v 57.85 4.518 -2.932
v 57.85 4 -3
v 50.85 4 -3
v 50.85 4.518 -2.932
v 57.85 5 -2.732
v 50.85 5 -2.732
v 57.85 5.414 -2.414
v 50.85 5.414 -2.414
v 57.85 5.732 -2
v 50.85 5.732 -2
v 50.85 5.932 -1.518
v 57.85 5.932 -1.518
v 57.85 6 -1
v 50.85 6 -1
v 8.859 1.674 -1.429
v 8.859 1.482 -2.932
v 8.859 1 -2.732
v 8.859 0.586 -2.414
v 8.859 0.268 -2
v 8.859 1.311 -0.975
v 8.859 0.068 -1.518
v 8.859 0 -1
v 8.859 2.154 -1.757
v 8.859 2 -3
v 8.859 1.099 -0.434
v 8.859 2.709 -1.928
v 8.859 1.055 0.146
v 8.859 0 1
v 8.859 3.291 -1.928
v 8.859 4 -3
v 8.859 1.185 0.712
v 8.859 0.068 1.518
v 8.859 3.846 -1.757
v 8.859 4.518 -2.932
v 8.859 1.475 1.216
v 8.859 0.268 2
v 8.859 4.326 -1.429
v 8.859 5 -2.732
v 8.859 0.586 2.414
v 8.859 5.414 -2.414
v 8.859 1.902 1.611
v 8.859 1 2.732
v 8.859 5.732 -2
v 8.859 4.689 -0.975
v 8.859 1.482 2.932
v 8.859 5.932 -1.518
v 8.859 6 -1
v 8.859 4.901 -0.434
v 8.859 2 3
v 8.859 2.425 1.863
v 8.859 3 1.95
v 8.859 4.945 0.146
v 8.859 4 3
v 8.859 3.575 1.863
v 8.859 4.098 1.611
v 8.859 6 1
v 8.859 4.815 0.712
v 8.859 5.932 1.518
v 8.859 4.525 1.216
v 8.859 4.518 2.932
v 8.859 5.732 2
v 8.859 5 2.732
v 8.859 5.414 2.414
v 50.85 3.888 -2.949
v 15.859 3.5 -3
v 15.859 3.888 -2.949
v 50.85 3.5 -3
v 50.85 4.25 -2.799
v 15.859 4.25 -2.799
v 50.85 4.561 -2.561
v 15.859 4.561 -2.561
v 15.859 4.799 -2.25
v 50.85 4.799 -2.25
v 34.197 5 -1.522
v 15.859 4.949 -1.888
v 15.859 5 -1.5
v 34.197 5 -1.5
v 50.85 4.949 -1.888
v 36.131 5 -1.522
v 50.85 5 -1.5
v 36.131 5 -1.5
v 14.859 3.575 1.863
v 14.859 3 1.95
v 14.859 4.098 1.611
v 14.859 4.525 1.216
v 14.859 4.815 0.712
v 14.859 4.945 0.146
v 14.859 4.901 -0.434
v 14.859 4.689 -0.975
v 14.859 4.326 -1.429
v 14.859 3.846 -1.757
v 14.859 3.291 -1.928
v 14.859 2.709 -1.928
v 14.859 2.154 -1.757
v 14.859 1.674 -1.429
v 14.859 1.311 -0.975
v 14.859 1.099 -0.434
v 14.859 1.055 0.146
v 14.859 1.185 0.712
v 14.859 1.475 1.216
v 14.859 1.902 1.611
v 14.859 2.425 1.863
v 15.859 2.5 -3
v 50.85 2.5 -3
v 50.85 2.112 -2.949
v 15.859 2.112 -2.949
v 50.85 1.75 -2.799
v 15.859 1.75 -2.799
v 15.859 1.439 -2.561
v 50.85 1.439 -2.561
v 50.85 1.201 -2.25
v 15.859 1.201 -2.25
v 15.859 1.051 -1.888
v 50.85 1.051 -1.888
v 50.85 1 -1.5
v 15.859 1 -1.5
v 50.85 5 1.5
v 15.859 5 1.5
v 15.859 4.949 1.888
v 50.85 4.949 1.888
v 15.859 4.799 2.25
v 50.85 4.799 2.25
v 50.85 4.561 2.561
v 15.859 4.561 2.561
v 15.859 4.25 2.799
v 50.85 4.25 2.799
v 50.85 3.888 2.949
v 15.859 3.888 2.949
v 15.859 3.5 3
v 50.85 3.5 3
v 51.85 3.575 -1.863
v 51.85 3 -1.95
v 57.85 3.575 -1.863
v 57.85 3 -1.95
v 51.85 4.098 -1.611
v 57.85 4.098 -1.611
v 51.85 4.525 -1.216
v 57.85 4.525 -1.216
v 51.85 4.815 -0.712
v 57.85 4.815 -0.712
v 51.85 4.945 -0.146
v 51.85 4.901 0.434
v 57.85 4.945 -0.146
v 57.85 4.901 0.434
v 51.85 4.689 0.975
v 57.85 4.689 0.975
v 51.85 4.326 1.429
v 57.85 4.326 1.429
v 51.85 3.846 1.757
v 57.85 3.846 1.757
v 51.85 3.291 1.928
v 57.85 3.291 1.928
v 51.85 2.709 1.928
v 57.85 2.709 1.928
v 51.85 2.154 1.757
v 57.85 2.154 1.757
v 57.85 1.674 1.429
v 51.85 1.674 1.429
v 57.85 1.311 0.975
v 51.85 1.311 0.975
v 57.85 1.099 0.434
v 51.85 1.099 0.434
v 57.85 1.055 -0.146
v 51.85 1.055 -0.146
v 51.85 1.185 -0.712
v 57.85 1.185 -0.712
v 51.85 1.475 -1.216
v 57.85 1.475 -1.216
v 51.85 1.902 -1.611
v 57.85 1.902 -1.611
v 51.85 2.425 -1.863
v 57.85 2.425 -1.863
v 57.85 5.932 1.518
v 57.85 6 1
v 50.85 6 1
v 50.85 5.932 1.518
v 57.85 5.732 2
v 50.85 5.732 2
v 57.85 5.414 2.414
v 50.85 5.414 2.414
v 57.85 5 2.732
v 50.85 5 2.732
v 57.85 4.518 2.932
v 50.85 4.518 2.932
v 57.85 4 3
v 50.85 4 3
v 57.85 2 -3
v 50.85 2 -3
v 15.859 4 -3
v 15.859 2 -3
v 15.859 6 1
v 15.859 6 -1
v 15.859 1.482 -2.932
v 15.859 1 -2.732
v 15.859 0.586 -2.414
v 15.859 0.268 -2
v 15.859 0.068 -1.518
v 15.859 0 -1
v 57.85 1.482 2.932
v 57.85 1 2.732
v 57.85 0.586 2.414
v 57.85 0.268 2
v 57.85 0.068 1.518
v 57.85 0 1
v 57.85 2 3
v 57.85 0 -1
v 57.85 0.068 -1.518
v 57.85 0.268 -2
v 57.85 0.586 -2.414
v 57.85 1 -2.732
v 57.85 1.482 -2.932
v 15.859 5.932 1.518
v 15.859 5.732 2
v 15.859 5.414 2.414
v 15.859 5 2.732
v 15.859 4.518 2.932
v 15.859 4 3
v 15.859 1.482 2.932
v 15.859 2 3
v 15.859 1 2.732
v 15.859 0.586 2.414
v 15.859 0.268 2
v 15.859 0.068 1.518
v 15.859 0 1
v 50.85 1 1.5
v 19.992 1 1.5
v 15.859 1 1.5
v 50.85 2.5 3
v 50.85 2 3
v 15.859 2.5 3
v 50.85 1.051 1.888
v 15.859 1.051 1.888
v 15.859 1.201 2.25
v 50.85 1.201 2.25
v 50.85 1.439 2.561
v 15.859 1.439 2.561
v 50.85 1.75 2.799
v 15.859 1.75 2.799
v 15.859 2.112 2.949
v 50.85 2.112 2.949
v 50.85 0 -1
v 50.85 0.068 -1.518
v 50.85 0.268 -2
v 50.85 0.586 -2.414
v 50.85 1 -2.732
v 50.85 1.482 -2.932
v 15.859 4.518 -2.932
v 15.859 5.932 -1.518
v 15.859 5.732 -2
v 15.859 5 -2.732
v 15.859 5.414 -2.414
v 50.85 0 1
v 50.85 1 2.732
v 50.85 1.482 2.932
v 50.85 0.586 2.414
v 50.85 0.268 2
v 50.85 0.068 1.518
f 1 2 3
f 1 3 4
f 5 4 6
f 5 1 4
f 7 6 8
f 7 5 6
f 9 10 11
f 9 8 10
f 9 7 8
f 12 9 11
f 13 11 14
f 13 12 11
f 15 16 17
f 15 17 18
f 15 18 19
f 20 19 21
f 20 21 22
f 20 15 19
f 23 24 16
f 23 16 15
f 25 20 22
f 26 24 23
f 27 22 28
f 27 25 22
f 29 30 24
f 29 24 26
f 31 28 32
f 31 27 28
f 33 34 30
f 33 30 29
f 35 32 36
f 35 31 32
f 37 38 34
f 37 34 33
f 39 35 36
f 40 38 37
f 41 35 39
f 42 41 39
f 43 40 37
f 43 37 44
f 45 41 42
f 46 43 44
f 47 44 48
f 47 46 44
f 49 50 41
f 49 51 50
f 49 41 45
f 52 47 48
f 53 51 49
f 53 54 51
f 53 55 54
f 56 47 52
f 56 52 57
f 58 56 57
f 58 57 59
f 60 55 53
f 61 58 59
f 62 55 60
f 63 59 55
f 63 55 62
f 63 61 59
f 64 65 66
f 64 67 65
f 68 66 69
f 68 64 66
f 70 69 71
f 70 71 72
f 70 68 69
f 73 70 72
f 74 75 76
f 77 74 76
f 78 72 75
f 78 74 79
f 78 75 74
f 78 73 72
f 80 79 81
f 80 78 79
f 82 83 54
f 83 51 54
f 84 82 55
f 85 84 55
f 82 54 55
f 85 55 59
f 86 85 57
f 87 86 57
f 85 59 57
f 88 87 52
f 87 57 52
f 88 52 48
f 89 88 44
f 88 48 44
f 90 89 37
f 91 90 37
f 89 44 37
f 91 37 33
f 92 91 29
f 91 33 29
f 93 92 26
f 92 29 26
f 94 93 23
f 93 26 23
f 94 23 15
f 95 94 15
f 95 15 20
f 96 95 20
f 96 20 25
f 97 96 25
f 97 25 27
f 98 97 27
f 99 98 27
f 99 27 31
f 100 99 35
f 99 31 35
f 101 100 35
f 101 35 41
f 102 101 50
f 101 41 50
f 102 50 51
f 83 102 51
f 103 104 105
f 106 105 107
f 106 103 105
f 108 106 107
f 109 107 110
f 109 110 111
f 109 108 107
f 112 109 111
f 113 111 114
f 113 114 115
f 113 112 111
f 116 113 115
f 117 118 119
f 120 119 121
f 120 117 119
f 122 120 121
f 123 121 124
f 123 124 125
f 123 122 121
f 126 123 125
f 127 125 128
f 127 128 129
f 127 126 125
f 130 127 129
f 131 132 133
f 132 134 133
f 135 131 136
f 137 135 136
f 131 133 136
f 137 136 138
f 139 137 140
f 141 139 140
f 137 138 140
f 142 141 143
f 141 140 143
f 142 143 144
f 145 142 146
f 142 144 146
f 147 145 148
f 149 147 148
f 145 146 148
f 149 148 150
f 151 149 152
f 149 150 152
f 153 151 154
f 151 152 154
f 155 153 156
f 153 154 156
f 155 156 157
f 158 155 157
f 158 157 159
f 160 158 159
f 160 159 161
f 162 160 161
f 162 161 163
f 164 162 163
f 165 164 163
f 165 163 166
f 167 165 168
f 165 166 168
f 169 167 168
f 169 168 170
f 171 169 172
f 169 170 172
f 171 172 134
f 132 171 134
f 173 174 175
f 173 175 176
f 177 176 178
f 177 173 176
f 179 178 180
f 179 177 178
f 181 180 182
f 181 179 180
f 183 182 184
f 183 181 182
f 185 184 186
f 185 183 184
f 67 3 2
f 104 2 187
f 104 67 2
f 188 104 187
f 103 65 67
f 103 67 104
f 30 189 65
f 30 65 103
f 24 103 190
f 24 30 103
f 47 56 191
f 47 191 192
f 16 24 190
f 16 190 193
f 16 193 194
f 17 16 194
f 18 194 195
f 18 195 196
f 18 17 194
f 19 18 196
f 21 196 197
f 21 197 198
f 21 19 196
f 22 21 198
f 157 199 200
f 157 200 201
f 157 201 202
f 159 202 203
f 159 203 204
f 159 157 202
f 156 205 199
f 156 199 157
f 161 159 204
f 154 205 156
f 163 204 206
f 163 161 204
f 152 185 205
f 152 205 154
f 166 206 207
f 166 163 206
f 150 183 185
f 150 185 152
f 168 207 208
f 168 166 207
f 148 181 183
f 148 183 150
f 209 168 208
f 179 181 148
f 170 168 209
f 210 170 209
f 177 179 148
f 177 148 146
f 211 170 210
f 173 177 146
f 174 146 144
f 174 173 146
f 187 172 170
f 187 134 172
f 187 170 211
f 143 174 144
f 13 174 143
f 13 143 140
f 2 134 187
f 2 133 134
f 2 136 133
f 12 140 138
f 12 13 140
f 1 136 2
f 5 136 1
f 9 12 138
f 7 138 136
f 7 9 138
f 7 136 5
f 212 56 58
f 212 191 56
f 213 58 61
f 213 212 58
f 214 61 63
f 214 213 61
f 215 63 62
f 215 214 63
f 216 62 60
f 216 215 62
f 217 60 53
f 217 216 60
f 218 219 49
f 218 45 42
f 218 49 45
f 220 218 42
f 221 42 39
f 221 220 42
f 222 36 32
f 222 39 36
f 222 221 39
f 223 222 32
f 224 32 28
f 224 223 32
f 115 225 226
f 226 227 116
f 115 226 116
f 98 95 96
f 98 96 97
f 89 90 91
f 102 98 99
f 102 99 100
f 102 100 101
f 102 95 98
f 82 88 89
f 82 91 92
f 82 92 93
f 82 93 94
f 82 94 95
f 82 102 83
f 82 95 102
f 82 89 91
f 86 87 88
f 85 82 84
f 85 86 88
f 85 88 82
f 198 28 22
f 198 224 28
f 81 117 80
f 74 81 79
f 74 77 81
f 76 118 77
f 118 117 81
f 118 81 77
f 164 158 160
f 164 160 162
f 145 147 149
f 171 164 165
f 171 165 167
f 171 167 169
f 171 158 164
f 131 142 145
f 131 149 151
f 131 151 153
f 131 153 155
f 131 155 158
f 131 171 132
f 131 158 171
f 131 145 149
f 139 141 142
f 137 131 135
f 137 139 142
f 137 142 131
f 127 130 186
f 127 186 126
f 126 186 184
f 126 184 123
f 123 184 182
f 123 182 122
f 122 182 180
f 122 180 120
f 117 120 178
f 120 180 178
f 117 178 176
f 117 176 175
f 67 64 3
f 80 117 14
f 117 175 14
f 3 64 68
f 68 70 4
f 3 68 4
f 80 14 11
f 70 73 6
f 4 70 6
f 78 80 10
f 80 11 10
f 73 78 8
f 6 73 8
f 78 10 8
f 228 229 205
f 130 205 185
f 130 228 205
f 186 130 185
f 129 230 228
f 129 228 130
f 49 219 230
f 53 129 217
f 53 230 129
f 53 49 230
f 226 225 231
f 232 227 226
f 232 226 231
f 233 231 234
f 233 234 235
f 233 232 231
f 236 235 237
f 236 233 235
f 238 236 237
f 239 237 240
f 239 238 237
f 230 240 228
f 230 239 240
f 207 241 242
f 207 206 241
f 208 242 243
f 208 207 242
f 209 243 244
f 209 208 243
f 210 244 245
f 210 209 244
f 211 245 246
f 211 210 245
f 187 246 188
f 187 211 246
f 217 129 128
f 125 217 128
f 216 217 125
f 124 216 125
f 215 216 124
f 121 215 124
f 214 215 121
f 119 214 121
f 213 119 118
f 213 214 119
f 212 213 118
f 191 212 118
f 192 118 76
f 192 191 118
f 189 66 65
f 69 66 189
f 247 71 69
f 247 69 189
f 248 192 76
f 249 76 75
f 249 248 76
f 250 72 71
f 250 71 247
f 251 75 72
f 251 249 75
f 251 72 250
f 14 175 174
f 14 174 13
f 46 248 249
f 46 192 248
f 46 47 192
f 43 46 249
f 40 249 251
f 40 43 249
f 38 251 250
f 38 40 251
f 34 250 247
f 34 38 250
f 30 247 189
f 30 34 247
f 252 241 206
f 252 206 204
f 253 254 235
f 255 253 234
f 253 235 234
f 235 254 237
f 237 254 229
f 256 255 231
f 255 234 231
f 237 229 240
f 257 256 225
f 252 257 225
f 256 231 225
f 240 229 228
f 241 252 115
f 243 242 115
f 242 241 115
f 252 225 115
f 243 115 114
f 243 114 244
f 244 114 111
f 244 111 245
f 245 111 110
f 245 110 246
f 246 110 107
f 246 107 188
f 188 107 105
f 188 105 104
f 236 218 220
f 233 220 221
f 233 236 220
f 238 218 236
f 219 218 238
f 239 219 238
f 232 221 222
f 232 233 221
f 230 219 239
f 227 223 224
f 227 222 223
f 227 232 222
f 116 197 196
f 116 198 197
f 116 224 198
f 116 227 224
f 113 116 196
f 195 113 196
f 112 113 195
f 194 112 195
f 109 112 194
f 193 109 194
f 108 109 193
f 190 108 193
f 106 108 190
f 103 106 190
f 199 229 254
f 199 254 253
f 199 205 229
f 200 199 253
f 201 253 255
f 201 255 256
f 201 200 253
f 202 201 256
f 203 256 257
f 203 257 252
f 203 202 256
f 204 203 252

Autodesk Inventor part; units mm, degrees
ref_plane "YZ Plane" through (0, 0, 0) normal (1, 0, 0) x (0, 1, 0)
ref_plane "XZ Plane" through (0, 0, 0) normal (0, 1, 0) x (-1, 0, 0)
ref_plane "XY Plane" through (0, 0, 0) normal (0, 0, 1) x (1, 0, 0)
sketch "Sketch1" plane through (0, 0, 0) normal (0, 1, 0) x (-1, 0, 0)
  point P0 (0, 0)
sketch "Sketch2" plane through (0, 0, 0) normal (0, 1, 0) x (-1, 0, 0)
  circle A0 centre (0, 0) radius 3.85
  dimension "d0" = 7.7
extrude "Extrusion1" add sketch "Sketch2" along normal blind 6
sketch "Sketch3" plane through (0, 6, 0) normal (0, 1, 0) x (1, 0, 0)
  circle A0 centre (0, 0) radius 1
  dimension "d3" = 2
extrude "Extrusion2" cut sketch "Sketch3" against normal through all
sketch "Sketch4" plane through (0, 0, 0) normal (0, -1, 0) x (1, 0, 0)
  circle A0 centre (0, 0) radius 3.85 projected
  line L0 (0, 3.85) -> (3.85, 3.85)
  line L1 (3.85, 3.85) -> (3.85, -3.85)
  line L2 (3.85, -3.85) -> (0, -3.85)
  line L3 (3.85, 3.85) -> (4.85, 3.85)
  line L4 (4.85, 3.85) -> (4.85, -3.85)
  line L5 (4.85, -3.85) -> (3.85, -3.85)
  line L6 (3.85, -3.85) -> (3.85, 3.85)
  line L7 (4.85, 3.85) -> (4.85, 3)
  line L8 (4.85, -3.85) -> (4.85, -3)
  line L9 (4.85, 3) -> (3.85, 3)
  line L10 (3.85, 3) -> (3.85, -3)
  line L11 (3.85, -3) -> (4.85, -3)
  line L12 (4.85, -3) -> (4.85, 3)
  point P0 (3.85, -3)
  dimension "d6" = 1
  dimension "d7" = 0.85
  dimension "d8" = 0.85
extrude "Extrusion3" add sketch "Sketch4" against normal blind 6 contours L1 L9 L4 L11
sketch "Sketch5" plane through (4.85, 0, 3) normal (1, 0, 0) x (0, 0, -1)
  line L0 (6.85, 0) -> (-0.85, 0) projected
  line L1 (6, 0) -> (6, 6) projected
  line L2 (0.0003, 0) -> (6, 0)
  line L3 (6, 0) -> (6, 1)
  line L4 (6, 1) -> (0.0003, 1)
  line L5 (0.0003, 1) -> (0.0003, 0)
  line L6 (6.85, 6) -> (-0.85, 6) projected
  line L7 (0.0003, 6) -> (6, 6)
  line L8 (6, 6) -> (6, 5)
  line L9 (6, 5) -> (0.0003, 5)
  line L10 (0.0003, 5) -> (0.0003, 6)
  point P0 (3, 0)
  point P1 (3, 6)
  dimension "d11" = 1
  dimension "d12" = 1
extrude "Extrusion4" cut sketch "Sketch5" against normal blind 1 contours L9 L10 L6 L1
extrude "Extrusion5" cut sketch "Sketch5" against normal blind 1 contours L0 L5 L4 L1
sketch "Sketch6" plane through (4.85, 5, 2.9997) normal (0, 0, -1) x (-1, 0, 0)
  line L0 (0, 0) -> (1, 0) projected
  line L1 (0, -5) -> (0, 1) projected
  line L2 (1, 0) -> (0, 0)
  line L3 (0, 0) -> (0, 1)
  line L4 (0, 1) -> (1, 1)
  line L5 (1, 1) -> (1, 0)
  line L6 (1, -5) -> (0, -5)
  line L7 (0, -5) -> (0, -3.9916)
  line L8 (0, -3.9916) -> (1, -3.9916)
  line L9 (1, -3.9916) -> (1, -5)
  point P0 (4.85, -5)
extrude "Extrusion6" cut sketch "Sketch6" against normal through all contours L1 L4 L5 L0
extrude "Extrusion7" cut sketch "Sketch6" against normal through all contours L1 L8 L9 L6
sketch "Sketch7" plane through (4.85, 5, 3) normal (1, 0, 0) x (0, 0, -1)
  line L0 (0, 0) -> (3, 0) projected
  line L1 (6, -4) -> (6, 0) projected
  line L2 (0, 0) -> (6, 0)
  line L3 (6, 0) -> (6, -4)
  line L4 (6, -4) -> (0, -4)
  line L5 (0, -4) -> (0, 0)
  point P0 (3, -5)
extrude "Extrusion8" add sketch "Sketch7" along normal blind 71
sketch "Sketch8" plane through (3.85, 1, -3) normal (0, 0, -1) x (-1, 0, 0)
  point P0 (3.85, -1)
sketch "Sketch9" plane through (3.85, 5, 0) normal (0, 1, 0) x (1, 0, 0)
  line L0 (72, 3) -> (72, -3) projected
  line L1 (72, 0) -> (75.85, 0)
  circle A0 centre (75.85, 0) radius 3.85
  point P0 (-3.85, 0)
  dimension "d23" = 3.85
extrude "Extrusion9" add sketch "Sketch9" along normal blind 1
extrude "Extrusion10" add sketch "Sketch9" against normal blind 5
sketch "Sketch10" plane through (79.7, 6, 0) normal (0, 1, 0) x (1, 0, 0)
  circle A0 centre (0, 0) radius 1.85
  point P0 (-79.7, 0)
  dimension "d28" = 3.7
extrude "Extrusion11" cut sketch "Sketch10" against normal through all
sketch "Sketch11" plane through (3.85, 5, 0) normal (-1, 0, 0) x (0, 0, 1)
  point P0 (0, -5)
sketch "Sketch12" plane through (3.85, 5, -3) normal (-1, 0, 0) x (0, 0, 1)
  line L0 (0, 0) -> (3, 0) projected
  line L1 (6, 0) -> (6, -4) projected
  line L2 (0, 0) -> (6, 0)
  line L3 (6, 0) -> (6, -4)
  line L4 (6, -4) -> (0, -4)
  line L5 (0, -4) -> (0, 0)
  point P0 (3, -5)
extrude "Extrusion12" add sketch "Sketch12" along normal blind 2
sketch "Sketch13" plane through (75.85, 5, 3) normal (1, 0, 0) x (0, 0, -1)
  line L0 (3, 0) -> (0, 0) projected
  line L1 (3, -4) -> (6, -4) projected
  line L2 (0, 0) -> (6, 0)
  line L3 (6, 0) -> (6, -4)
  line L4 (6, -4) -> (0, -4)
  line L5 (0, -4) -> (0, 0)
  point P0 (3, -5)
extrude "Extrusion13" add sketch "Sketch13" along normal blind 1.6
fillet "Fillet1" radius 1.5 2 edges at (76.5685, 5, 3) (39.1315, 5, 3)
fillet "Fillet2" radius 1.5 1 edges at (39.85, 5, -3)
fillet "Fillet3" radius 1.5 1 edges at (39.85, 1, -3)
fillet "Fillet4" radius 1.5 3 edges at (4.35, 1, 2.9997) (40.35, 1, 3) (4.85, 1, 2.9998)
sketch "Sketch14" plane through (3.5458, 5, 1.5) normal (0, 1, 0) x (1, 0, 0)
  point P0 (-3.5458, 1.5)
sketch "Sketch15" plane through (3.5458, 5, 1.5) normal (0, 1, 0) x (1, 0, 0)
  line L0 (0.4177, 2.9988) -> (2.9717, 2.9988) construction
  line L1 (2.9717, 2.9988) -> (2.9717, -0.0492) construction
  line L2 (2.9717, -0.0492) -> (0.4177, -0.0492) construction
  line L3 (0.4177, -0.0492) -> (0.4177, 2.9988) construction
  line L4 (0.398, -0.0492) -> (1.4255, 2.9988)
  line L5 (1.4255, 2.9988) -> (1.9244, 2.9988)
  line L6 (1.9244, 2.9988) -> (2.952, -0.0492)
  line L7 (2.952, -0.0492) -> (2.5247, -0.0492)
  line L8 (2.5247, -0.0492) -> (2.248, 0.803)
  line L9 (2.248, 0.803) -> (1.0846, 0.803)
  line L10 (1.0846, 0.803) -> (0.808, -0.0492)
  line L11 (0.808, -0.0492) -> (0.398, -0.0492)
  line L12 (2.1369, 1.1488) -> (1.6651, 2.5839)
  line L13 (1.6651, 2.5839) -> (1.1958, 1.1488)
  line L14 (1.1958, 1.1488) -> (2.1369, 1.1488)
  point P0 (-3.5458, 1.5)
extrude "Extrusion14" add sketch "Sketch15" along normal blind 0.2
sketch "Sketch16" plane through (3.5458, 5, -1.5) normal (0, 1, 0) x (1, 0, 0)
  line L0 (69.8363, -0.0038) -> (72.3064, -0.0038) construction
  line L1 (72.3064, -0.0038) -> (72.3064, -3.0518) construction
  line L2 (72.3064, -3.0518) -> (69.8363, -3.0518) construction
  line L3 (69.8363, -3.0518) -> (69.8363, -0.0038) construction
  spline S0 degree 2 poles (72.2125, -2.1157) (72.2125, -2.3429) (72.0396, -2.6912) (71.8963, -2.8048) knots 0 0 0 1 2 2 2
  spline S1 degree 2 poles (71.8963, -2.8048) (71.7234, -2.9382) (71.3307, -3.0518) (71.0195, -3.0518) knots 0 0 0 1 2 2 2
  line L4 (71.0195, -3.0518) -> (70.1451, -3.0518)
  line L5 (70.1451, -3.0518) -> (70.1451, -0.0038)
  line L6 (70.1451, -0.0038) -> (70.9528, -0.0038)
  spline S2 degree 2 poles (70.9528, -0.0038) (71.2788, -0.0038) (71.6049, -0.0458) (71.7531, -0.1273) knots 0 0 0 1 2 2 2
  spline S3 degree 2 poles (71.7531, -0.1273) (71.9186, -0.2138) (72.0692, -0.4978) (72.0692, -0.6905) knots 0 0 0 1 2 2 2
  spline S4 degree 2 poles (72.0692, -0.6905) (72.0692, -0.9054) (71.842, -1.2462) (71.6419, -1.3426) knots 0 0 0 1 2 2 2
  line L7 (71.6419, -1.3426) -> (71.6419, -1.3574)
  spline S5 degree 2 poles (71.6419, -1.3574) (71.9136, -1.4315) (72.2125, -1.8242) (72.2125, -2.1157) knots 0 0 0 1 2 2 2
  spline S6 degree 2 poles (71.7901, -2.133) (71.7901, -1.9601) (71.6913, -1.7378) (71.5431, -1.6587) knots 0 0 0 1 2 2 2
  spline S7 degree 2 poles (71.5431, -1.6587) (71.4468, -1.6093) (71.2195, -1.5797) (71.0096, -1.5797) knots 0 0 0 1 2 2 2
  line L8 (71.0096, -1.5797) -> (70.5502, -1.5797)
  line L9 (70.5502, -1.5797) -> (70.5502, -2.706)
  line L10 (70.5502, -2.706) -> (70.8787, -2.706)
  spline S8 degree 2 poles (70.8787, -2.706) (71.1454, -2.706) (71.4517, -2.6566) (71.5703, -2.5776) knots 0 0 0 1 2 2 2
  spline S9 degree 2 poles (71.5703, -2.5776) (71.6839, -2.4961) (71.7901, -2.2935) (71.7901, -2.133) knots 0 0 0 1 2 2 2
  spline S10 degree 2 poles (71.6469, -0.7473) (71.6469, -0.6386) (71.5728, -0.4756) (71.4912, -0.4287) knots 0 0 0 1 2 2 2
  spline S11 degree 2 poles (71.4912, -0.4287) (71.3924, -0.3743) (71.1529, -0.3496) (70.938, -0.3496) knots 0 0 0 1 2 2 2
  line L11 (70.938, -0.3496) -> (70.5502, -0.3496)
  line L12 (70.5502, -0.3496) -> (70.5502, -1.2413)
  line L13 (70.5502, -1.2413) -> (71.0096, -1.2413)
  spline S12 degree 2 poles (71.0096, -1.2413) (71.1998, -1.2413) (71.3801, -1.2018) (71.4764, -1.14) knots 0 0 0 1 2 2 2
  spline S13 degree 2 poles (71.4764, -1.14) (71.5703, -1.0807) (71.6469, -0.8905) (71.6469, -0.7473) knots 0 0 0 1 2 2 2
  point P0 (-3.5458, -1.5)
extrude "Extrusion15" add sketch "Sketch16" along normal blind 0.2
sketch "Sketch17" plane through (3.5458, 5, -1.5) normal (0, 1, 0) x (1, 0, 0)
  line L0 (0.4145, -1.5) -> (36.4145, -1.5)
  line L1 (30.4487, 0.0859) -> (55.6072, 0.0859) construction
  line L2 (55.6072, 0.0859) -> (55.6072, -2.5363) construction
  line L3 (55.6072, -2.5363) -> (30.4487, -2.5363) construction
  line L4 (30.4487, -2.5363) -> (30.4487, 0.0859) construction
  line L5 (32.5853, -0.4353) -> (31.2663, -3.0264)
  line L6 (31.2663, -3.0264) -> (30.8316, -3.0264)
  line L7 (30.8316, -3.0264) -> (32.2247, -0.3365)
  line L8 (32.2247, -0.3365) -> (30.6513, -0.3365)
  line L9 (30.6513, -0.3365) -> (30.6513, 0.0216)
  line L10 (30.6513, 0.0216) -> (32.5853, 0.0216)
  line L11 (32.5853, 0.0216) -> (32.5853, -0.4353)
  line L12 (34.838, -3.0264) -> (32.9583, -3.0264)
  line L13 (32.9583, -3.0264) -> (32.9583, -2.5941)
  spline S0 degree 2 poles (32.9583, -2.5941) (33.1608, -2.4039) (33.5214, -2.0507) (33.6943, -1.8605) knots 0 0 0 1 2 2 2
  spline S1 degree 2 poles (33.6943, -1.8605) (34.0426, -1.4777) (34.297, -1.0182) (34.297, -0.7737) knots 0 0 0 1 2 2 2
  spline S2 degree 2 poles (34.297, -0.7737) (34.297, -0.6453) (34.218, -0.4526) (34.1464, -0.3909) knots 0 0 0 1 2 2 2
  spline S3 degree 2 poles (34.1464, -0.3909) (34.0747, -0.3291) (33.887, -0.2674) (33.7734, -0.2674) knots 0 0 0 1 2 2 2
  spline S4 degree 2 poles (33.7734, -0.2674) (33.6647, -0.2674) (33.4424, -0.3217) (33.3411, -0.3637) knots 0 0 0 1 2 2 2
  spline S5 degree 2 poles (33.3411, -0.3637) (33.2547, -0.3983) (33.0941, -0.4971) (33.0447, -0.5317) knots 0 0 0 1 2 2 2
  line L14 (33.0447, -0.5317) -> (33.0225, -0.5317)
  line L15 (33.0225, -0.5317) -> (33.0225, -0.0969)
  spline S6 degree 2 poles (33.0225, -0.0969) (33.1485, -0.0352) (33.6005, 0.0859) (33.803, 0.0859) knots 0 0 0 1 2 2 2
  spline S7 degree 2 poles (33.803, 0.0859) (34.2303, 0.0859) (34.712, -0.3662) (34.712, -0.7515) knots 0 0 0 1 2 2 2
  spline S8 degree 2 poles (34.712, -0.7515) (34.712, -0.9318) (34.628, -1.2331) (34.5539, -1.3616) knots 0 0 0 1 2 2 2
  spline S9 degree 2 poles (34.5539, -1.3616) (34.4798, -1.495) (34.2649, -1.7568) (34.1464, -1.8828) knots 0 0 0 1 2 2 2
  spline S10 degree 2 poles (34.1464, -1.8828) (33.9537, -2.0927) (33.4819, -2.5422) (33.3411, -2.6732) knots 0 0 0 1 2 2 2
  line L16 (33.3411, -2.6732) -> (34.838, -2.6732)
  line L17 (34.838, -2.6732) -> (34.838, -3.0264)
  line L18 (37.8958, -3.0264) -> (37.8958, -1.7024)
  spline S11 degree 2 poles (37.8958, -1.7024) (37.8958, -1.5444) (37.8711, -1.2751) (37.8316, -1.201) knots 0 0 0 1 2 2 2
  spline S12 degree 2 poles (37.8316, -1.201) (37.7921, -1.1195) (37.6414, -1.0405) (37.5105, -1.0405) knots 0 0 0 1 2 2 2
  spline S13 degree 2 poles (37.5105, -1.0405) (37.392, -1.0405) (37.1203, -1.1862) (36.977, -1.3245) knots 0 0 0 1 2 2 2
  spline S14 degree 2 poles (36.977, -1.3245) (36.9795, -1.3591) (36.9844, -1.4554) (36.9844, -1.5197) knots 0 0 0 1 2 2 2
  line L19 (36.9844, -1.5197) -> (36.9844, -3.0264)
  line L20 (36.9844, -3.0264) -> (36.5991, -3.0264)
  line L21 (36.5991, -3.0264) -> (36.5991, -1.7024)
  spline S15 degree 2 poles (36.5991, -1.7024) (36.5991, -1.5444) (36.5744, -1.2751) (36.5349, -1.201) knots 0 0 0 1 2 2 2
  spline S16 degree 2 poles (36.5349, -1.201) (36.4953, -1.1195) (36.3447, -1.0405) (36.2138, -1.0405) knots 0 0 0 1 2 2 2
  spline S17 degree 2 poles (36.2138, -1.0405) (36.0903, -1.0405) (35.8161, -1.1961) (35.6876, -1.3171) knots 0 0 0 1 2 2 2
  line L22 (35.6876, -1.3171) -> (35.6876, -3.0264)
  line L23 (35.6876, -3.0264) -> (35.3023, -3.0264)
  line L24 (35.3023, -3.0264) -> (35.3023, -0.7391)
  line L25 (35.3023, -0.7391) -> (35.6876, -0.7391)
  line L26 (35.6876, -0.7391) -> (35.6876, -0.9911)
  spline S18 degree 2 poles (35.6876, -0.9911) (35.8383, -0.8404) (36.1347, -0.6749) (36.3126, -0.6749) knots 0 0 0 1 2 2 2
  spline S19 degree 2 poles (36.3126, -0.6749) (36.5151, -0.6749) (36.8288, -0.8602) (36.9103, -1.0701) knots 0 0 0 1 2 2 2
  spline S20 degree 2 poles (36.9103, -1.0701) (37.0857, -0.875) (37.4167, -0.6749) (37.6093, -0.6749) knots 0 0 0 1 2 2 2
  spline S21 degree 2 poles (37.6093, -0.6749) (37.7575, -0.6749) (37.9996, -0.7663) (38.0885, -0.87) knots 0 0 0 1 2 2 2
  spline S22 degree 2 poles (38.0885, -0.87) (38.1799, -0.9738) (38.2812, -1.285) (38.2812, -1.5197) knots 0 0 0 1 2 2 2
  line L27 (38.2812, -1.5197) -> (38.2812, -3.0264)
  line L28 (38.2812, -3.0264) -> (37.8958, -3.0264)
  line L29 (41.4156, -3.0264) -> (41.4156, -1.7024)
  spline S23 degree 2 poles (41.4156, -1.7024) (41.4156, -1.5444) (41.3909, -1.2751) (41.3514, -1.201) knots 0 0 0 1 2 2 2
  spline S24 degree 2 poles (41.3514, -1.201) (41.3119, -1.1195) (41.1612, -1.0405) (41.0303, -1.0405) knots 0 0 0 1 2 2 2
  spline S25 degree 2 poles (41.0303, -1.0405) (40.9117, -1.0405) (40.64, -1.1862) (40.4968, -1.3245) knots 0 0 0 1 2 2 2
  spline S26 degree 2 poles (40.4968, -1.3245) (40.4992, -1.3591) (40.5042, -1.4554) (40.5042, -1.5197) knots 0 0 0 1 2 2 2
  line L30 (40.5042, -1.5197) -> (40.5042, -3.0264)
  line L31 (40.5042, -3.0264) -> (40.1189, -3.0264)
  line L32 (40.1189, -3.0264) -> (40.1189, -1.7024)
  spline S27 degree 2 poles (40.1189, -1.7024) (40.1189, -1.5444) (40.0942, -1.2751) (40.0546, -1.201) knots 0 0 0 1 2 2 2
  spline S28 degree 2 poles (40.0546, -1.201) (40.0151, -1.1195) (39.8644, -1.0405) (39.7335, -1.0405) knots 0 0 0 1 2 2 2
  spline S29 degree 2 poles (39.7335, -1.0405) (39.61, -1.0405) (39.3359, -1.1961) (39.2074, -1.3171) knots 0 0 0 1 2 2 2
  line L33 (39.2074, -1.3171) -> (39.2074, -3.0264)
  line L34 (39.2074, -3.0264) -> (38.8221, -3.0264)
  line L35 (38.8221, -3.0264) -> (38.8221, -0.7391)
  line L36 (38.8221, -0.7391) -> (39.2074, -0.7391)
  line L37 (39.2074, -0.7391) -> (39.2074, -0.9911)
  spline S30 degree 2 poles (39.2074, -0.9911) (39.3581, -0.8404) (39.6545, -0.6749) (39.8323, -0.6749) knots 0 0 0 1 2 2 2
  spline S31 degree 2 poles (39.8323, -0.6749) (40.0349, -0.6749) (40.3486, -0.8602) (40.4301, -1.0701) knots 0 0 0 1 2 2 2
  spline S32 degree 2 poles (40.4301, -1.0701) (40.6054, -0.875) (40.9364, -0.6749) (41.1291, -0.6749) knots 0 0 0 1 2 2 2
  spline S33 degree 2 poles (41.1291, -0.6749) (41.2773, -0.6749) (41.5194, -0.7663) (41.6083, -0.87) knots 0 0 0 1 2 2 2
  spline S34 degree 2 poles (41.6083, -0.87) (41.6997, -0.9738) (41.8009, -1.285) (41.8009, -1.5197) knots 0 0 0 1 2 2 2
  line L38 (41.8009, -1.5197) -> (41.8009, -3.0264)
  line L39 (41.8009, -3.0264) -> (41.4156, -3.0264)
  point P0 (-3.5458, -1.5)
  dimension "d43" = 36
extrude "Extrusion16" add sketch "Sketch17" along normal blind 0.2
sketch "Sketch18" plane through (3.5458, 5.2, -1.5) normal (0, 1, 0) x (1, 0, 0)
  line L0 (29.8828, 2.0952) -> (43.3392, 2.0952)
  line L1 (43.3392, 2.0952) -> (43.3392, -5.5663)
  line L2 (43.3392, -5.5663) -> (29.8828, -5.5663)
  line L3 (29.8828, -5.5663) -> (29.8828, 2.0952)
  point P0 (-3.5458, -1.5)
extrude "Extrusion17" cut sketch "Sketch18" against normal blind 0.2
sketch "Sketch19" plane through (3.5458, 5.2, 1.5) normal (0, 1, 0) x (1, 0, 0)
  line L0 (0.3624, -0.1736) -> (3.3783, -0.1736)
  line L1 (3.3783, -0.1736) -> (3.3783, 3.2897)
  line L2 (3.3783, 3.2897) -> (0.3624, 3.2897)
  line L3 (0.3624, 3.2897) -> (0.3624, -0.1736)
  line L4 (72.2697, -0.5369) -> (69.8008, -0.5369)
  line L5 (69.8008, -0.5369) -> (69.8008, 3.7021)
  line L6 (69.8008, 3.7021) -> (72.2697, 3.7021)
  line L7 (72.2697, 3.7021) -> (72.2697, -0.5369)
  point P0 (-3.5458, 1.5)
extrude "Extrusion18" cut sketch "Sketch19" against normal blind 0.2 contours L3 L2 L1 L0
extrude "Extrusion19" cut sketch "Sketch19" against normal blind 0.2 contours L4 L5 L6 L7
sketch "Sketch20" plane through (79.7, 0, 0) normal (0, -1, 0) x (1, 0, 0)
  point P0 (-79.7, 0)
sketch "Sketch21" plane through (79.7, 6, 0) normal (0, 1, 0) x (1, 0, 0)
  circle A0 centre (0, 0) radius 1.95
  point P0 (-79.7, 0)
  dimension "d52" = 3.9
extrude "Extrusion20" cut sketch "Sketch21" against normal through all
sketch "Sketch22" plane through (0, 6, 0) normal (0, 1, 0) x (1, 0, 0)
  line L0 (0, 0) -> (0, -3.85)
  circle A0 centre (0, 0) radius 3.85 projected
  line L1 (0, -3.85) -> (3.85, -3.85)
  line L2 (3.85, -3.85) -> (-3.85, -3.85)
  line L3 (-3.85, -3.85) -> (-3.85, 3.85)
  line L4 (-3.85, 3.85) -> (3.85, 3.85)
  line L5 (3.85, 3.85) -> (3.85, -3.85)
extrude "Extrusion21" cut sketch "Sketch22" against normal through all contours A0
sketch "Sketch23" plane through (79.7, 5, 0) normal (0, 1, 0) x (1, 0, 0)
  arc A0 (-76.1542, -1.5) -> (-76.1542, 1.5) centre (-79.7, 0) ccw projected
  line L0 (-75.85, 0) -> (-77.9753, 0)
  line L1 (-77.9753, 0) -> (-77.9753, 3.5992)
  line L2 (-77.9753, 3.5992) -> (-75.85, 3.5992)
  line L3 (-75.85, 3.5992) -> (-75.85, 0)
  line L4 (-75.85, 0) -> (-77.9753, 0)
  line L5 (-77.9753, 0) -> (-77.9753, -3.4561)
  line L6 (-77.9753, -3.4561) -> (-75.85, -3.4561)
  line L7 (-75.85, -3.4561) -> (-75.85, 0)
  line L8 (-75.85, -3.4561) -> (-65.85, -3.4561)
  line L9 (-65.85, -3.4561) -> (-65.85, 3.5992)
  line L10 (-65.85, 3.5992) -> (-75.85, 3.5992)
  line L11 (-75.85, 3.5992) -> (-75.85, -3.4561)
  dimension "d57" = 10
extrude "Extrusion22" cut sketch "Sketch23" against normal through all contours L3 L10 L9 L8 L7
extrude "Extrusion23" cut sketch "Sketch23" against normal through all contours L7 L6 L5 L0
extrude "Extrusion24" cut sketch "Sketch23" against normal through all contours L0 L1 L2 L3
sketch "Sketch24" plane through (13.85, 5, -1.5) normal (-1, 0, 0) x (0, 0, 1)
  line L0 (-2.9013, -5) -> (5.7799, -5)
  line L1 (5.7799, -5) -> (5.7799, 1.344)
  line L2 (5.7799, 1.344) -> (-2.9013, 1.344)
  line L3 (-2.9013, 1.344) -> (-2.9013, -5)
  point P0 (1.5, -5)
extrude "Extrusion25" cut sketch "Sketch24" against normal blind 6.142
sketch "Sketch25" plane through (19.992, 5, -1.5) normal (-1, 0, 0) x (0, 0, 1)
  line L0 (-1.5, 0) -> (4.5, 0)
  line L1 (4.5, 0) -> (4.5, -4)
  line L2 (4.5, -4) -> (-1.5, -4)
  line L3 (-1.5, -4) -> (-1.5, 0)
  point P0 (1.5, -5)
  dimension "d66" = 6
  dimension "d67" = 4
extrude "Extrusion26" add sketch "Sketch25" along normal blind 6.133
sketch "Sketch26" plane through (79.7, 6, 0) normal (0, 1, 0) x (1, 0, 0)
  line L0 (-65.841, -3) -> (-65.841, 3) projected
  line L1 (-65.841, 0) -> (-69.691, 0)
  circle A0 centre (-69.691, 0) radius 3.85
  point P0 (-79.7, 0)
  dimension "d70" = 3.85
extrude "Extrusion27" add sketch "Sketch26" against normal blind 6
sketch "Sketch27" plane through (13.859, 5, -1.5) normal (-1, 0, 0) x (0, 0, 1)
  point P0 (1.5, -5)
sketch "Sketch28" plane through (13.859, 5, -1.5) normal (-1, 0, 0) x (0, 0, 1)
  line L0 (-1.5, 0) -> (-1.5, -4) projected
  line L1 (4.5, 0) -> (3, 0) projected
  line L2 (-1.5, -4) -> (4.5, -4)
  line L3 (4.5, -4) -> (4.5, 0)
  line L4 (4.5, 0) -> (-1.5, 0)
  line L5 (-1.5, 0) -> (-1.5, -4)
  point P0 (1.5, -5)
extrude "Extrusion28" add sketch "Sketch28" along normal blind 5
sketch "Sketch29" plane through (19.992, 3.5, 3) normal (0, 0, 1) x (1, 0, 0)
  point P0 (-19.992, -3.5)
sketch "Sketch30" plane through (79.7, 5, 0) normal (0, 1, 0) x (1, 0, 0)
  point P0 (-79.7, 0)
sketch "Sketch31" plane through (19.992, 5, -1.5) normal (1, 0, 0) x (0, 0, -1)
  arc A0 (-3, 0) -> (-4.5, -1.5) centre (-3, -1.5) ccw projected
  circle A1 centre (-3, -1.5) radius 1.5
  circle A2 centre (-3, -1.5) radius 1.5
  arc A3 (-4.5, -2.5) -> (-3, -4) centre (-3, -2.5) ccw projected
  circle A4 centre (-3, -2.5) radius 1.5
  arc A5 (0, -4) -> (1.5, -2.5) centre (0, -2.5) ccw projected
  circle A6 centre (0, -2.5) radius 1.5
  arc A7 (1.5, -1.5) -> (0, 0) centre (0, -1.5) ccw projected
  circle A8 centre (0, -1.5) radius 1.5
  line L0 (-4.5, -1.5) -> (-4.5, 0) projected
  line L1 (-4.5, 0) -> (-3, 0)
  line L2 (-3, 0) -> (-3, -1.5)
  line L3 (-3, -1.5) -> (-4.5, -1.5)
  line L4 (-4.5, -1.5) -> (-4.5, 0)
  line L5 (0, 0) -> (1.5, 0)
  line L6 (1.5, 0) -> (1.5, -1.5)
  line L7 (1.5, -1.5) -> (0, -1.5)
  line L8 (0, -1.5) -> (0, 0)
  line L9 (-3, -4) -> (-4.5, -4)
  line L10 (-4.5, -4) -> (-4.5, -2.5)
  line L11 (-4.5, -2.5) -> (-3, -2.5)
  line L12 (-3, -2.5) -> (-3, -4)
  line L13 (0, -4) -> (1.5, -4)
  line L14 (1.5, -4) -> (1.5, -2.5)
  line L15 (1.5, -2.5) -> (0, -2.5)
  line L16 (0, -2.5) -> (0, -4)
  point P0 (-1.5, -5)
extrude "Extrusion29" cut sketch "Sketch31" against normal blind 10 contours A0 L0 L1
extrude "Extrusion30" cut sketch "Sketch31" against normal blind 10 contours A3 L9 L10
extrude "Extrusion31" cut sketch "Sketch31" against normal blind 10 contours A5 L14 L13
extrude "Extrusion32" cut sketch "Sketch31" against normal blind 10 contours L5 L6 A7
sketch "Sketch32" plane through (79.7, 6, 0) normal (0, 1, 0) x (1, 0, 0)
  point P0 (-79.7, 0)
sketch "Sketch33" plane through (10.009, 6, 0) normal (0, 1, 0) x (1, 0, 0)
  circle A0 centre (0, 0) radius 3.85
  point P0 (-10.009, 0)
extrude "Extrusion33" add sketch "Sketch33" against normal blind 6
sketch "Sketch34" plane through (10.009, 6, 0) normal (0, 1, 0) x (1, 0, 0)
  circle A0 centre (0, 0) radius 1.925
  point P0 (-10.009, 0)
  dimension "d85" = 3.85
extrude "Extrusion34" cut sketch "Sketch34" against normal blind 6
sketch "Sketch35" plane through (10.009, 6, 0) normal (0, 1, 0) x (1, 0, 0)
  point P0 (-10.009, 0)
sketch "Sketch36" plane through (79.7, 6, 0) normal (0, 1, 0) x (1, 0, 0)
  point P0 (-79.7, 0)
sketch "Sketch37" plane through (79.7, 6, 0) normal (0, 1, 0) x (1, 0, 0)
  point P0 (-79.7, 0)
sketch "Sketch38" plane through (10.009, 6, 0) normal (0, 1, 0) x (1, 0, 0)
  circle A0 centre (0, 0) radius 1.95
  point P0 (-10.009, 0)
  dimension "d89" = 3.9
extrude "Extrusion35" cut sketch "Sketch38" against normal blind 6
sketch "Sketch39" plane through (79.7, 6, 0) normal (0, 1, 0) x (1, 0, 0)
  point P0 (-79.7, 0)
sketch "Sketch40" plane through (79.7, 6, 0) normal (0, 1, 0) x (1, 0, 0)
  point P0 (-79.7, 0)
sketch "Sketch41" plane through (79.7, 6, 0) normal (0, 1, 0) x (1, 0, 0)
  point P0 (-79.7, 0)
sketch "Sketch42" plane through (79.7, 6, 0) normal (0, 1, 0) x (1, 0, 0)
  circle A0 centre (0, 0) radius 3
  arc A1 (-66.1452, -1.5) -> (-66.1452, 1.5) centre (-69.691, 0) ccw projected
  circle A2 centre (-69.691, 0) radius 3
  point P0 (-79.7, 0)
  dimension "d92" = 6
  dimension "d93" = 6
extrude "Extrusion36" cut sketch "Sketch42" against normal through all contours A0
extrude "Extrusion37" cut sketch "Sketch42" against normal through all contours A2
sketch "Sketch43" plane through (10.009, 0, 0) normal (0, -1, 0) x (1, 0, 0)
  circle A0 centre (0, 0) radius 3.85 projected
  line L0 (0, 3.85) -> (-5, 3.85)
  line L1 (-5, 3.85) -> (-5, -3.85)
  line L2 (-5, -3.85) -> (0, -3.85)
  line L3 (0, -3.85) -> (0, 3.85)
  line L4 (-5, 3.85) -> (-4.5, 3.85)
  line L5 (-4.5, 3.85) -> (-4.5, -3.85)
  line L6 (-4.5, -3.85) -> (-5, -3.85)
  line L7 (-5, -3.85) -> (-5, 3.85)
  point P0 (-10.009, 0)
  dimension "d98" = 5
  dimension "d99" = 0.5
extrude "Extrusion38" add sketch "Sketch43" against normal blind 1 contours L5 L2 L1 L0
sketch "Sketch44" plane through (5.009, 0, -3.85) normal (-1, 0, 0) x (0, 0, 1)
  point P0 (3.85, 0)
sketch "Sketch45" plane through (5.009, 0, -3.85) normal (-1, 0, 0) x (0, 0, 1)
  line L0 (7.7, 1) -> (0, 1) projected
  line L1 (0, 0) -> (7.7, 0) projected
  line L2 (0, 1) -> (7.7, 1)
  line L3 (7.7, 1) -> (7.7, 0)
  line L4 (7.7, 0) -> (0, 0)
  line L5 (0, 0) -> (0, 1)
  point P0 (3.85, 0)
extrude "Extrusion39" cut sketch "Sketch45" against normal through all
sketch "Sketch46" plane through (10.009, 6, 0) normal (0, 1, 0) x (1, 0, 0)
  circle A0 centre (0, 0) radius 3.85 projected
  line L0 (0, 3.85) -> (-5, 3.85)
  line L1 (-5, 3.85) -> (-5, -3.85)
  line L2 (-5, -3.85) -> (0, -3.85)
  line L3 (0, -3.85) -> (0, 3.85)
  line L4 (-5, 3.85) -> (-4.5, 3.85)
  line L5 (-4.5, 3.85) -> (-4.5, -3.85)
  line L6 (-4.5, -3.85) -> (-5, -3.85)
  line L7 (-5, -3.85) -> (-5, 3.85)
  point P0 (-10.009, 0)
  dimension "d104" = 5
  dimension "d105" = 0.5
extrude "Extrusion40" add sketch "Sketch46" against normal blind 1 contours L5 L2 L1 L0
sketch "Sketch47" plane through (5.009, 6, -3.85) normal (-1, 0, 0) x (0, 0, 1)
  line L0 (0, 0) -> (0, -1) projected
  line L1 (0, -1) -> (7.7, -1) projected
  line L2 (0, 0) -> (7.7, 0)
  line L3 (7.7, 0) -> (7.7, -1)
  line L4 (7.7, -1) -> (0, -1)
  line L5 (0, -1) -> (0, 0)
  point P0 (3.85, -6)
extrude "Extrusion41" cut sketch "Sketch47" against normal through all
sketch "Sketch48" plane through (12.422, 2.5, 3) normal (0, 0, 1) x (1, 0, 0)
  line L0 (1.1328, 2.5) -> (63.7322, 2.5) projected
  line L1 (1.1328, -1.5) -> (63.7322, -1.5) projected
  line L2 (63.7322, 2.5) -> (63.7322, -1.5)
  line L3 (63.7322, 2.5) -> (71.128, 2.5) projected
  line L4 (71.128, 2.5) -> (63.7322, -1.5)
  line L5 (63.7322, 2.5) -> (71.128, -1.5)
  line L6 (71.128, -1.5) -> (71.128, 2.5) projected
  circle A0 centre (67.4301, 0.5) radius 4.2041
  line L7 (67.4301, 0.5) -> (67.4301, -1.5)
  line L8 (64.278, -1.5) -> (70.278, -1.5) projected
  line L9 (70.278, 2.5) -> (70.278, -1.5) projected
  line L10 (71.128, 0.6263) -> (70.278, 0.6263)
  line L11 (63.7322, 0.5) -> (64.5822, 0.5)
  line L12 (64.5822, 2.5) -> (64.5822, -1.5)
  line L13 (70.278, 2.5) -> (70.278, -1.5)
  line L14 (64.5822, 2.5) -> (70.278, -1.5)
  line L15 (70.278, 2.5) -> (64.5822, -1.5)
  circle A1 centre (67.4301, 0.5) radius 3.48
  line L16 (63.7322, 2.5) -> (71.128, 2.5)
  point P0 (-12.422, -2.5)
  dimension "d110" = 4
  dimension "d111" = 0.85
extrude "Extrusion42" add sketch "Sketch48" against normal blind 6 contours A0 L3 A1
sketch "Sketch49" plane through (12.422, 2.5, 3) normal (0, 0, 1) x (1, 0, 0)
  line L0 (71.128, 2.5) -> (61.853, 2.5)
  line L1 (61.853, 2.5) -> (61.853, 6.3445)
  line L2 (61.853, 6.3445) -> (71.128, 6.3445)
  line L3 (71.128, 6.3445) -> (71.128, 2.5)
  point P0 (-12.422, -2.5)
extrude "Extrusion43" cut sketch "Sketch49" against normal through all
sketch "Sketch50" plane through (79.7, 5, 0) normal (0, 1, 0) x (1, 0, 0)
  arc A0 (-3.5458, -1.5) -> (-3.5458, 1.5) centre (0, 0) ccw projected
  line L0 (0, -3.85) -> (3.85, -3.85)
  circle A1 centre (0, 0) radius 3.85
  line L1 (0, 3.85) -> (-3.85, 3.85)
  line L2 (-3.85, 3.85) -> (3.85, 3.85)
  line L3 (3.85, 3.85) -> (3.85, -3.85)
  line L4 (3.85, -3.85) -> (-3.85, -3.85)
  line L5 (-3.85, -3.85) -> (-3.85, 3.85)
  circle A2 centre (-69.691, 0) radius 3 projected
  arc A3 (-66.1452, 1.5) -> (-66.1452, -1.5) centre (-69.691, 0) ccw projected
  circle A4 centre (-69.691, 0) radius 3.85
  line L6 (-69.691, 3.85) -> (-73.541, 3.85)
  line L7 (-73.541, 3.85) -> (-65.841, 3.85)
  line L8 (-65.841, 3.85) -> (-65.841, -3.85)
  line L9 (-65.841, -3.85) -> (-73.541, -3.85)
  line L10 (-73.541, -3.85) -> (-73.541, 3.85)
  point P0 (-79.7, 0)
  point P1 (-3.85, 0)
  point P2 (-3.5458, -1.5)
  point P3 (-3.5458, 1.5)
  point P4 (-69.691, -3.85)
  point P5 (-65.841, 0)
  point P6 (-66.1452, -1.5)
extrude "Extrusion44" cut sketch "Sketch50" against normal blind 10 contours A0 L4 L5 A1
extrude "Extrusion45" cut sketch "Sketch50" against normal blind 10 contours L5 L1 A0 A1
extrude "Extrusion46" cut sketch "Sketch50" against normal blind 10 contours A1 A0
extrude "Extrusion47" cut sketch "Sketch50" against normal blind 10 contours L8 L9 A3 A4
extrude "Extrusion48" cut sketch "Sketch50" against normal blind 10 contours A3 L7 L8 A4
extrude "Extrusion49" cut sketch "Sketch50" against normal blind 10 contours A4 A3
sketch "Sketch51" plane through (75.85, 5, 1.5) normal (1, 0, 0) x (0, 0, -1)
  line L0 (-1.5, 0) -> (4.5, 0)
  line L1 (4.5, 0) -> (4.5, -5)
  line L2 (4.5, -5) -> (-1.5, -5)
  line L3 (-1.5, -5) -> (-1.5, 0)
  line L4 (-1.5, 0) -> (4.5, 0)
  line L5 (4.5, 0) -> (4.5, 1)
  line L6 (4.5, 1) -> (-1.5, 1)
  line L7 (-1.5, 1) -> (-1.5, 0)
  point P0 (1.5, -5)
  point P1 (4.5, 0)
  dimension "d128" = 5
  dimension "d129" = 1
extrude "Extrusion50" add sketch "Sketch51" along normal blind 5 contours L0 L1 L2 L3
extrude "Extrusion51" add sketch "Sketch51" along normal blind 5 contours L7 L6 L5 L0
sketch "Sketch52" plane through (13.859, 5, -1.5) normal (-1, 0, 0) x (0, 0, 1)
  line L0 (-1.5, -5) -> (-1.5, 1) projected
  line L1 (4.5, -5) -> (-1.5, -5) projected
  line L2 (-1.5, 1) -> (4.5, 1)
  line L3 (4.5, 1) -> (4.5, -5)
  line L4 (4.5, -5) -> (-1.5, -5)
  line L5 (-1.5, -5) -> (-1.5, 1)
  point P0 (1.5, -5)
extrude "Extrusion52" add sketch "Sketch52" along normal blind 5
sketch "Sketch53" plane through (13.859, 5, -1.5) normal (1, 0, 0) x (0, 0, -1)
  line L0 (-4.5, 1) -> (-4.5, -1.5) projected
  line L1 (1.5, -5) -> (1.5, -2.5) projected
  line L2 (-4.5, 1) -> (1.5, 1)
  line L3 (1.5, 1) -> (1.5, -5)
  line L4 (1.5, -5) -> (-4.5, -5)
  line L5 (-4.5, -5) -> (-4.5, 1)
  point P0 (-1.5, -5)
extrude "Extrusion53" add sketch "Sketch53" along normal blind 2
sketch "Sketch54" plane through (75.85, 5, 1.5) normal (-1, 0, 0) x (0, 0, 1)
  line L0 (-4.5, -5) -> (1.5, -5) projected
  line L1 (1.5, 1) -> (-4.5, 1) projected
  line L2 (-4.5, -5) -> (1.5, -5)
  line L3 (1.5, -5) -> (1.5, 1)
  line L4 (1.5, 1) -> (-4.5, 1)
  line L5 (-4.5, 1) -> (-4.5, -5)
  point P0 (-1.5, -5)
extrude "Extrusion54" add sketch "Sketch54" along normal blind 2
sketch "Sketch55" plane through (80.85, 5, 1.5) normal (1, 0, 0) x (0, 0, -1)
  circle A0 centre (1.5, -2) radius 1.95
  point P0 (1.5, -5)
  dimension "d140" = 3.9
extrude "Extrusion55" cut sketch "Sketch55" against normal blind 6
sketch "Sketch56" plane through (8.859, 5, -1.5) normal (-1, 0, 0) x (0, 0, 1)
  circle A0 centre (1.5, -2) radius 1.95
  point P0 (1.5, -5)
  dimension "d143" = 3.9
extrude "Extrusion56" cut sketch "Sketch56" against normal blind 6
fillet "Fillet5" radius 2 4 edges at (12.359, 6, 3) (12.359, 0, 3) (12.359, 6, -3) (12.359, 0, -3)
fillet "Fillet6" radius 2 4 edges at (77.35, 6, 3) (77.35, 6, -3) (77.35, 0, -3) (77.35, 0, 3)
sketch "Sketch57" plane through (80.85, 5, 1.5) normal (1, 0, 0) x (0, 0, -1)
  line L0 (-1.5, 1) -> (4.5, 1)
  line L1 (4.5, 1) -> (4.5, -5)
  line L2 (4.5, -5) -> (-1.5, -5)
  line L3 (-1.5, -5) -> (-1.5, 1)
  point P0 (1.5, -5)
  dimension "d148" = 6
  dimension "d149" = 6
extrude "Extrusion57" cut sketch "Sketch57" against normal blind 22
sketch "Sketch58" plane through (58.85, 5, 1.5) normal (1, 0, 0) x (0, 0, -1)
  line L0 (-1.5, 1) -> (4.5, 1)
  line L1 (4.5, 1) -> (4.5, -5)
  line L2 (4.5, -5) -> (-1.5, -5)
  line L3 (-1.5, -5) -> (-1.5, 1)
  point P0 (1.5, -5)
  dimension "d152" = 6
extrude "Extrusion58" add sketch "Sketch58" along normal blind 7
sketch "Sketch59" plane through (65.85, 5, 1.5) normal (1, 0, 0) x (0, 0, -1)
  circle A0 centre (1.5, -2) radius 1.95
  point P0 (1.5, -5)
  dimension "d155" = 3.9
extrude "Extrusion59" cut sketch "Sketch59" against normal blind 6
fillet "Fillet7" radius 2 1 edges at (62.35, 6, 3)
fillet "Fillet8" radius 2 1 edges at (62.35, 0, 3)
fillet "Fillet9" radius 2 1 edges at (62.35, 0, -3)
fillet "Fillet10" radius 2 1 edges at (62.35, 6, -3)
sketch "Sketch60" plane through (65.85, 5, 1.5) normal (1, 0, 0) x (0, 0, -1)
  line L0 (-1.5, 1) -> (4.5, 1)
  line L1 (4.5, 1) -> (4.5, -5)
  line L2 (4.5, -5) -> (-1.5, -5)
  line L3 (-1.5, -5) -> (-1.5, 1)
  point P0 (1.5, -5)
  dimension "d162" = 6
  dimension "d163" = 6
extrude "Extrusion60" cut sketch "Sketch60" against normal blind 15
sketch "Sketch61" plane through (50.85, 5, 1.5) normal (1, 0, 0) x (0, 0, -1)
  line L0 (-1.5, 1) -> (4.5, 1)
  line L1 (4.5, 1) -> (4.5, -5)
  line L2 (4.5, -5) -> (-1.5, -5)
  line L3 (-1.5, -5) -> (-1.5, 1)
  point P0 (1.5, -5)
  dimension "d166" = 6
  dimension "d167" = 6
extrude "Extrusion61" add sketch "Sketch61" along normal blind 7
fillet "Fillet11" radius 2 1 edges at (54.35, 6, 3)
fillet "Fillet12" radius 2 3 edges at (54.35, 0, 3) (54.35, 6, -3) (54.35, 0, -3)
sketch "Sketch62" plane through (57.85, 5, 1.5) normal (1, 0, 0) x (0, 0, -1)
  circle A0 centre (1.5, -2) radius 1.95
  point P0 (1.5, -5)
  dimension "d172" = 3.9
extrude "Extrusion62" cut sketch "Sketch62" against normal blind 6
properties part number "Part3_3DPrint"
